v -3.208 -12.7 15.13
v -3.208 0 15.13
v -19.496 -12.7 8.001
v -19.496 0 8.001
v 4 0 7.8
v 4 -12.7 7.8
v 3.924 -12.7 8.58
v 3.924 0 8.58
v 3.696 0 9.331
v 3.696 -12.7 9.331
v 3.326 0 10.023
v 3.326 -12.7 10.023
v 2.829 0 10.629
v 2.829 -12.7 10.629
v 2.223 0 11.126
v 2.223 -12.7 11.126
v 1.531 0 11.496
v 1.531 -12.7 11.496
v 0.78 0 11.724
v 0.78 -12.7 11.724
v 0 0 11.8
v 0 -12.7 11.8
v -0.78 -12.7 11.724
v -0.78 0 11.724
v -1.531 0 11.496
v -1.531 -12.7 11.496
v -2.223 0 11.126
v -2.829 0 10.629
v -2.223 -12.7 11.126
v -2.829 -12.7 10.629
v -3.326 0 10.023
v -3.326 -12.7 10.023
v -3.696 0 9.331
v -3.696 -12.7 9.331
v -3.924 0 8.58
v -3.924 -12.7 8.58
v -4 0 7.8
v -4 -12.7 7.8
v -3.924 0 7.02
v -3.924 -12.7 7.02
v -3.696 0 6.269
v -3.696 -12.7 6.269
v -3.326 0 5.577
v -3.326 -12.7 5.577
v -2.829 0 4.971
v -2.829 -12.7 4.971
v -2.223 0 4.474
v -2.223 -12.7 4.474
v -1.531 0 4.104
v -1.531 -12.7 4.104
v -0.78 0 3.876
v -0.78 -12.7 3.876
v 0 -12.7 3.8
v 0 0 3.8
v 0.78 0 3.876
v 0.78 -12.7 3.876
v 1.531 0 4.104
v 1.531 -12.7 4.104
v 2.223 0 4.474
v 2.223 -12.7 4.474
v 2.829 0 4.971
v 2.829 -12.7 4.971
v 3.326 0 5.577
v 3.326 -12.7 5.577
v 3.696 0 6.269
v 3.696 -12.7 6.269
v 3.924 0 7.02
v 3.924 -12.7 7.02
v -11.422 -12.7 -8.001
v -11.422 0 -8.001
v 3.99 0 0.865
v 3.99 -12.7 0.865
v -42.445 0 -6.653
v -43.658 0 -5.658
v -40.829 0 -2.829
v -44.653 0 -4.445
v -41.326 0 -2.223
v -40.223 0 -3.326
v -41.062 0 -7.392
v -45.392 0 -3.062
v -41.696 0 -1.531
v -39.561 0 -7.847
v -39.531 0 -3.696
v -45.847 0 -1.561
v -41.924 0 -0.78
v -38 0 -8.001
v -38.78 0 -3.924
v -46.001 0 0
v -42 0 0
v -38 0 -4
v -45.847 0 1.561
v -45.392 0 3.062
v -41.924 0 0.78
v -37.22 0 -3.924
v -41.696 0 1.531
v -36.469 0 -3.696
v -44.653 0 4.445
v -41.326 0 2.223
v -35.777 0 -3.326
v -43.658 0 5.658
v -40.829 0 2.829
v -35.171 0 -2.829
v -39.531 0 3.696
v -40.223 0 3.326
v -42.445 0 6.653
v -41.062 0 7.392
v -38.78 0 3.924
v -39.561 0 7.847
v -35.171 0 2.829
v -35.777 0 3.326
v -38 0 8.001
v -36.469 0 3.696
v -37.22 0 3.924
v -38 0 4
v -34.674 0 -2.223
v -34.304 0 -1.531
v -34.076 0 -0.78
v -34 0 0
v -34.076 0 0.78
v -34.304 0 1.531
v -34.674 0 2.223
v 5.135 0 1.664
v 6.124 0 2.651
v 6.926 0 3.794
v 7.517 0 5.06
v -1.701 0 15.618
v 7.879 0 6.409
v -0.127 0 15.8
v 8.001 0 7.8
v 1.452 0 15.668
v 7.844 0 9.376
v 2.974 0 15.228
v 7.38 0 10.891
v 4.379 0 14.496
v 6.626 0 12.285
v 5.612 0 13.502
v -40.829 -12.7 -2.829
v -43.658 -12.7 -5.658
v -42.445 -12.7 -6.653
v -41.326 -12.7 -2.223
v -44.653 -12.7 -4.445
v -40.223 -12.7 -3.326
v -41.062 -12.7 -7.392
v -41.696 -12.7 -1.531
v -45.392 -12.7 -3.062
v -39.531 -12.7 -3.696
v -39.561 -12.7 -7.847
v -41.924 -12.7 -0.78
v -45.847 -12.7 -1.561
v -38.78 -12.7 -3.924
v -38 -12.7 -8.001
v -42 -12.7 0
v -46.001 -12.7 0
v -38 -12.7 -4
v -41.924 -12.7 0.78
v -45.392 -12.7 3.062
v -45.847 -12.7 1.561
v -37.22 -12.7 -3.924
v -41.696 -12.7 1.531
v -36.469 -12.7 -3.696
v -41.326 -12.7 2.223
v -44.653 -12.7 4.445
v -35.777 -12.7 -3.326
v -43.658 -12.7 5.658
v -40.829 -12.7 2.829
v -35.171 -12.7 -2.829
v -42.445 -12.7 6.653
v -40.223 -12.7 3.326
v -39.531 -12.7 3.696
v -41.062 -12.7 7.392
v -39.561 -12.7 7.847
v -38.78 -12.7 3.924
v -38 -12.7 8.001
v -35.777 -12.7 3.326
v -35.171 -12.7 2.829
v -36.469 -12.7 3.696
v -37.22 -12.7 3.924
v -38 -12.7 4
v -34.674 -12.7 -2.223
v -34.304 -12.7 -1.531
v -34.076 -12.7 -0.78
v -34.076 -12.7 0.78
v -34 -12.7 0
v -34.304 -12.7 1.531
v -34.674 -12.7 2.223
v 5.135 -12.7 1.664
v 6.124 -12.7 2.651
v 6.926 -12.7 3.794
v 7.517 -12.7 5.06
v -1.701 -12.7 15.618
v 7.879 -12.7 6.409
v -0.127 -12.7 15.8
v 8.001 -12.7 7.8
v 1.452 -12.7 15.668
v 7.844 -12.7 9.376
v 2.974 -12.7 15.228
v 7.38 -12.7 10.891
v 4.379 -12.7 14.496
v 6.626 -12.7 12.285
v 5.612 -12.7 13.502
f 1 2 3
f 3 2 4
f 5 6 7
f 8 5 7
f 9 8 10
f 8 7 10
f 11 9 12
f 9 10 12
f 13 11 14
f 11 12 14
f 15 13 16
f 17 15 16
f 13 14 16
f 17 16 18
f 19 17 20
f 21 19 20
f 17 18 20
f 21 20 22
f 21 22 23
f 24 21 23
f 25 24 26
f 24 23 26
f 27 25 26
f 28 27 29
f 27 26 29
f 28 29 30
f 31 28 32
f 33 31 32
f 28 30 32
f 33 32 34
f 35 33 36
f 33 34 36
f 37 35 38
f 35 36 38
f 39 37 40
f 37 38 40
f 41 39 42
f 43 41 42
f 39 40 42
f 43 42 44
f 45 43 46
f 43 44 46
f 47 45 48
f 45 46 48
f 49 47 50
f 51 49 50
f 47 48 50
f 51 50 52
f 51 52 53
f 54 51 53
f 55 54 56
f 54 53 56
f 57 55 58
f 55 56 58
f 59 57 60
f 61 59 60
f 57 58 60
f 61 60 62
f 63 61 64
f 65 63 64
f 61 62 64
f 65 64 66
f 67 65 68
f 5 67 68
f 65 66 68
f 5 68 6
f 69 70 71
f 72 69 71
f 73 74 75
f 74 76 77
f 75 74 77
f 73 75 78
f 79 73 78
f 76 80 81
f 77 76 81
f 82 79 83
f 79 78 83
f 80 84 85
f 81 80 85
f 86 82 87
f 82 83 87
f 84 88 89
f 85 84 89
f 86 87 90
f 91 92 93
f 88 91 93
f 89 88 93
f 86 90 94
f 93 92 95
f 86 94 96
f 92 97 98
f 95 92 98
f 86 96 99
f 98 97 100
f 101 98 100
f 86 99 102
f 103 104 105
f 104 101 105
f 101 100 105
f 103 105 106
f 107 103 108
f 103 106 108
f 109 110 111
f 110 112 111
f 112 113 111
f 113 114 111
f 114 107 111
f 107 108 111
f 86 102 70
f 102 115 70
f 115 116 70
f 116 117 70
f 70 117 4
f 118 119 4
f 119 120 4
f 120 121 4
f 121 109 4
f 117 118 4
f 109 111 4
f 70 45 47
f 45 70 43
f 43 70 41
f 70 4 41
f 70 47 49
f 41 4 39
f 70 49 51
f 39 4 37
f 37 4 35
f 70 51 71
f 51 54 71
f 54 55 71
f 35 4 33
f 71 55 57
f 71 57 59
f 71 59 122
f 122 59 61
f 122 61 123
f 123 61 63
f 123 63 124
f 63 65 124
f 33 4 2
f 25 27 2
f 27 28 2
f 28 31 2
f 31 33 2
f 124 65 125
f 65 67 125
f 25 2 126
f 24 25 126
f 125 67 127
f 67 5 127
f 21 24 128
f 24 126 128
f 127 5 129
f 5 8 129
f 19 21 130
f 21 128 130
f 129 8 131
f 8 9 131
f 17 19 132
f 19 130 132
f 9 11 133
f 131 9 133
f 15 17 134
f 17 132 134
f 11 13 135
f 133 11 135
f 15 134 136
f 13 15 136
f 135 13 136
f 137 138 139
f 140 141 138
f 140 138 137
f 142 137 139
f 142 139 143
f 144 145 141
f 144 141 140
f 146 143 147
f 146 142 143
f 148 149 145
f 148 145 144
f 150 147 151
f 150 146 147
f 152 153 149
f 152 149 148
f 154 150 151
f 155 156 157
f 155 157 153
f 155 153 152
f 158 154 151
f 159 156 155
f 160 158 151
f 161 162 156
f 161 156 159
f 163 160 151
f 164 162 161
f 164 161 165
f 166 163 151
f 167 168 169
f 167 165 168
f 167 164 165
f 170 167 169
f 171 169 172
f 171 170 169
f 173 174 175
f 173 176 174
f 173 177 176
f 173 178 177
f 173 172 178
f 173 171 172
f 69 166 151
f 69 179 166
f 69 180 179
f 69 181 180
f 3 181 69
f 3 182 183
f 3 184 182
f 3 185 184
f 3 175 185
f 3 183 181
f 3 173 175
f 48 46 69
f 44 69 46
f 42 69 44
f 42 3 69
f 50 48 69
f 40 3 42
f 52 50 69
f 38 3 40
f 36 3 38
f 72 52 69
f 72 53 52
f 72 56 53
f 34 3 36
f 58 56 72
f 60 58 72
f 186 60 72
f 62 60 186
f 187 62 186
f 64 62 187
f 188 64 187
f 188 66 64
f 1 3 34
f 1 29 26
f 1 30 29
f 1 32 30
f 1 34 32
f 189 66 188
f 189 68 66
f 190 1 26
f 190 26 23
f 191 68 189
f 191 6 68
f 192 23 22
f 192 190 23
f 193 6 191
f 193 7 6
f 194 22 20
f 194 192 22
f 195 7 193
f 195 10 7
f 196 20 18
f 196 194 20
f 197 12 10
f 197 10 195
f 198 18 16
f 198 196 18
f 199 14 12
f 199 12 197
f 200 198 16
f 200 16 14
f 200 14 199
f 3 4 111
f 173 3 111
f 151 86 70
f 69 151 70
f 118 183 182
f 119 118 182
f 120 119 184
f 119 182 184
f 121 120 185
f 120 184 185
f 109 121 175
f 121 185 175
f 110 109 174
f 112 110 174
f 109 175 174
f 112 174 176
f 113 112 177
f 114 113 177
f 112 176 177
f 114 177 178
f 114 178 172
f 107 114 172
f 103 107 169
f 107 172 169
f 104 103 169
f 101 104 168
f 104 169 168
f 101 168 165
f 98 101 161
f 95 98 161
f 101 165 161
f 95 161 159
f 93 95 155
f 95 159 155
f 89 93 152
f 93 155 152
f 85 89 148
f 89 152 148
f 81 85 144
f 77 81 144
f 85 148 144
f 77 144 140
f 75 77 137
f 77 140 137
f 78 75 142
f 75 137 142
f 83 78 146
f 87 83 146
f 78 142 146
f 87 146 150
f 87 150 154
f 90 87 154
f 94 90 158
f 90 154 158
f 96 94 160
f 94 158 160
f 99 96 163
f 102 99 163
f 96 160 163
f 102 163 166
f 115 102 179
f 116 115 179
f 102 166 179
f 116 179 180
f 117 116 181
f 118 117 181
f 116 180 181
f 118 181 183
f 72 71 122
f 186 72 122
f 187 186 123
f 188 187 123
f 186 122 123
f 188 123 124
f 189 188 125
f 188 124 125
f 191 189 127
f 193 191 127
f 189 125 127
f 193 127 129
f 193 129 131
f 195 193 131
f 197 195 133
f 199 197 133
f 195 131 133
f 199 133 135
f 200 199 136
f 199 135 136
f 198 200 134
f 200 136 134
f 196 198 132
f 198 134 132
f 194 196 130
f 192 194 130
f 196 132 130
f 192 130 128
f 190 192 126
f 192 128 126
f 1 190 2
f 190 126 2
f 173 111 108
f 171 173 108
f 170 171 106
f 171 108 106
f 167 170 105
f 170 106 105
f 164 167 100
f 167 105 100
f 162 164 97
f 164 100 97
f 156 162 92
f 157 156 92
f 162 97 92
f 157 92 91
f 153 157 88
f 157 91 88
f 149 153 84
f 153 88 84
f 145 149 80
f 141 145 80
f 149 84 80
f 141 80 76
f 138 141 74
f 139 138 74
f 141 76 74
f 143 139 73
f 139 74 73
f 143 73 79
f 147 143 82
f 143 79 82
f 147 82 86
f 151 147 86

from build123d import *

# Parameters (mm, degrees)
F1_DEPTH = 12.7
F2_R     = 4.0005
F3_DEPTH = 12.7


with BuildPart() as f1:
    # F0 (on Front) → F1 (new body)
    with BuildSketch(Plane.XZ):
        with BuildLine():
            ThreePointArc((3.989522, 0.864604), (1.185338, -0.11271), (-1.782134, 0))
            Line((-1.782134, 0), (-29.999, 0))
            ThreePointArc((-29.999, 0), (-32.342439, -5.657561), (-38, -8.001))
            Line((-38, -8.001), (-11.422469, -8.001))
            Line((-11.422469, -8.001), (3.989522, 0.864604))
        make_face()
        with BuildLine():
            Line((-29.999, 0), (-1.782134, 0))
            ThreePointArc((-1.782134, 0), (-7.965707, 7.049325), (-3.207935, 15.129744))
            Line((-3.207935, 15.129744), (-19.496256, 8.001))
            Line((-19.496256, 8.001), (-38, 8.001))
            ThreePointArc((-38, 8.001), (-32.342439, 5.657561), (-29.999, 0))
        make_face()
        with BuildLine():
            ThreePointArc((-3.207935, 15.129744), (-7.965707, 7.049325), (-1.782134, 0))
            ThreePointArc((-1.782134, 0), (1.185338, -0.11271), (3.989522, 0.864604))
            ThreePointArc((3.989522, 0.864604), (6.925899, 3.794015), (8.001, 7.8))
            ThreePointArc((8.001, 7.8), (4.378888, 14.496368), (-3.207935, 15.129744))
        make_face()
        with BuildLine():
            ThreePointArc((-38, -8.001), (-32.342439, -5.657561), (-29.999, 0))
            ThreePointArc((-29.999, 0), (-32.342439, 5.657561), (-38, 8.001))
            ThreePointArc((-38, 8.001), (-46.001, 0), (-38, -8.001))
        make_face()
    extrude(amount=F1_DEPTH)

    # F2 (on face) → F3 (cut, through all)
    with BuildSketch(Plane.XZ.offset(12.7)):
        with Locations((-38, 0)):
            Circle(F2_R)
        with Locations((0, 7.8)):
            Circle(F2_R)
    extrude(amount=-F3_DEPTH, mode=Mode.SUBTRACT)


solid = f1.part
